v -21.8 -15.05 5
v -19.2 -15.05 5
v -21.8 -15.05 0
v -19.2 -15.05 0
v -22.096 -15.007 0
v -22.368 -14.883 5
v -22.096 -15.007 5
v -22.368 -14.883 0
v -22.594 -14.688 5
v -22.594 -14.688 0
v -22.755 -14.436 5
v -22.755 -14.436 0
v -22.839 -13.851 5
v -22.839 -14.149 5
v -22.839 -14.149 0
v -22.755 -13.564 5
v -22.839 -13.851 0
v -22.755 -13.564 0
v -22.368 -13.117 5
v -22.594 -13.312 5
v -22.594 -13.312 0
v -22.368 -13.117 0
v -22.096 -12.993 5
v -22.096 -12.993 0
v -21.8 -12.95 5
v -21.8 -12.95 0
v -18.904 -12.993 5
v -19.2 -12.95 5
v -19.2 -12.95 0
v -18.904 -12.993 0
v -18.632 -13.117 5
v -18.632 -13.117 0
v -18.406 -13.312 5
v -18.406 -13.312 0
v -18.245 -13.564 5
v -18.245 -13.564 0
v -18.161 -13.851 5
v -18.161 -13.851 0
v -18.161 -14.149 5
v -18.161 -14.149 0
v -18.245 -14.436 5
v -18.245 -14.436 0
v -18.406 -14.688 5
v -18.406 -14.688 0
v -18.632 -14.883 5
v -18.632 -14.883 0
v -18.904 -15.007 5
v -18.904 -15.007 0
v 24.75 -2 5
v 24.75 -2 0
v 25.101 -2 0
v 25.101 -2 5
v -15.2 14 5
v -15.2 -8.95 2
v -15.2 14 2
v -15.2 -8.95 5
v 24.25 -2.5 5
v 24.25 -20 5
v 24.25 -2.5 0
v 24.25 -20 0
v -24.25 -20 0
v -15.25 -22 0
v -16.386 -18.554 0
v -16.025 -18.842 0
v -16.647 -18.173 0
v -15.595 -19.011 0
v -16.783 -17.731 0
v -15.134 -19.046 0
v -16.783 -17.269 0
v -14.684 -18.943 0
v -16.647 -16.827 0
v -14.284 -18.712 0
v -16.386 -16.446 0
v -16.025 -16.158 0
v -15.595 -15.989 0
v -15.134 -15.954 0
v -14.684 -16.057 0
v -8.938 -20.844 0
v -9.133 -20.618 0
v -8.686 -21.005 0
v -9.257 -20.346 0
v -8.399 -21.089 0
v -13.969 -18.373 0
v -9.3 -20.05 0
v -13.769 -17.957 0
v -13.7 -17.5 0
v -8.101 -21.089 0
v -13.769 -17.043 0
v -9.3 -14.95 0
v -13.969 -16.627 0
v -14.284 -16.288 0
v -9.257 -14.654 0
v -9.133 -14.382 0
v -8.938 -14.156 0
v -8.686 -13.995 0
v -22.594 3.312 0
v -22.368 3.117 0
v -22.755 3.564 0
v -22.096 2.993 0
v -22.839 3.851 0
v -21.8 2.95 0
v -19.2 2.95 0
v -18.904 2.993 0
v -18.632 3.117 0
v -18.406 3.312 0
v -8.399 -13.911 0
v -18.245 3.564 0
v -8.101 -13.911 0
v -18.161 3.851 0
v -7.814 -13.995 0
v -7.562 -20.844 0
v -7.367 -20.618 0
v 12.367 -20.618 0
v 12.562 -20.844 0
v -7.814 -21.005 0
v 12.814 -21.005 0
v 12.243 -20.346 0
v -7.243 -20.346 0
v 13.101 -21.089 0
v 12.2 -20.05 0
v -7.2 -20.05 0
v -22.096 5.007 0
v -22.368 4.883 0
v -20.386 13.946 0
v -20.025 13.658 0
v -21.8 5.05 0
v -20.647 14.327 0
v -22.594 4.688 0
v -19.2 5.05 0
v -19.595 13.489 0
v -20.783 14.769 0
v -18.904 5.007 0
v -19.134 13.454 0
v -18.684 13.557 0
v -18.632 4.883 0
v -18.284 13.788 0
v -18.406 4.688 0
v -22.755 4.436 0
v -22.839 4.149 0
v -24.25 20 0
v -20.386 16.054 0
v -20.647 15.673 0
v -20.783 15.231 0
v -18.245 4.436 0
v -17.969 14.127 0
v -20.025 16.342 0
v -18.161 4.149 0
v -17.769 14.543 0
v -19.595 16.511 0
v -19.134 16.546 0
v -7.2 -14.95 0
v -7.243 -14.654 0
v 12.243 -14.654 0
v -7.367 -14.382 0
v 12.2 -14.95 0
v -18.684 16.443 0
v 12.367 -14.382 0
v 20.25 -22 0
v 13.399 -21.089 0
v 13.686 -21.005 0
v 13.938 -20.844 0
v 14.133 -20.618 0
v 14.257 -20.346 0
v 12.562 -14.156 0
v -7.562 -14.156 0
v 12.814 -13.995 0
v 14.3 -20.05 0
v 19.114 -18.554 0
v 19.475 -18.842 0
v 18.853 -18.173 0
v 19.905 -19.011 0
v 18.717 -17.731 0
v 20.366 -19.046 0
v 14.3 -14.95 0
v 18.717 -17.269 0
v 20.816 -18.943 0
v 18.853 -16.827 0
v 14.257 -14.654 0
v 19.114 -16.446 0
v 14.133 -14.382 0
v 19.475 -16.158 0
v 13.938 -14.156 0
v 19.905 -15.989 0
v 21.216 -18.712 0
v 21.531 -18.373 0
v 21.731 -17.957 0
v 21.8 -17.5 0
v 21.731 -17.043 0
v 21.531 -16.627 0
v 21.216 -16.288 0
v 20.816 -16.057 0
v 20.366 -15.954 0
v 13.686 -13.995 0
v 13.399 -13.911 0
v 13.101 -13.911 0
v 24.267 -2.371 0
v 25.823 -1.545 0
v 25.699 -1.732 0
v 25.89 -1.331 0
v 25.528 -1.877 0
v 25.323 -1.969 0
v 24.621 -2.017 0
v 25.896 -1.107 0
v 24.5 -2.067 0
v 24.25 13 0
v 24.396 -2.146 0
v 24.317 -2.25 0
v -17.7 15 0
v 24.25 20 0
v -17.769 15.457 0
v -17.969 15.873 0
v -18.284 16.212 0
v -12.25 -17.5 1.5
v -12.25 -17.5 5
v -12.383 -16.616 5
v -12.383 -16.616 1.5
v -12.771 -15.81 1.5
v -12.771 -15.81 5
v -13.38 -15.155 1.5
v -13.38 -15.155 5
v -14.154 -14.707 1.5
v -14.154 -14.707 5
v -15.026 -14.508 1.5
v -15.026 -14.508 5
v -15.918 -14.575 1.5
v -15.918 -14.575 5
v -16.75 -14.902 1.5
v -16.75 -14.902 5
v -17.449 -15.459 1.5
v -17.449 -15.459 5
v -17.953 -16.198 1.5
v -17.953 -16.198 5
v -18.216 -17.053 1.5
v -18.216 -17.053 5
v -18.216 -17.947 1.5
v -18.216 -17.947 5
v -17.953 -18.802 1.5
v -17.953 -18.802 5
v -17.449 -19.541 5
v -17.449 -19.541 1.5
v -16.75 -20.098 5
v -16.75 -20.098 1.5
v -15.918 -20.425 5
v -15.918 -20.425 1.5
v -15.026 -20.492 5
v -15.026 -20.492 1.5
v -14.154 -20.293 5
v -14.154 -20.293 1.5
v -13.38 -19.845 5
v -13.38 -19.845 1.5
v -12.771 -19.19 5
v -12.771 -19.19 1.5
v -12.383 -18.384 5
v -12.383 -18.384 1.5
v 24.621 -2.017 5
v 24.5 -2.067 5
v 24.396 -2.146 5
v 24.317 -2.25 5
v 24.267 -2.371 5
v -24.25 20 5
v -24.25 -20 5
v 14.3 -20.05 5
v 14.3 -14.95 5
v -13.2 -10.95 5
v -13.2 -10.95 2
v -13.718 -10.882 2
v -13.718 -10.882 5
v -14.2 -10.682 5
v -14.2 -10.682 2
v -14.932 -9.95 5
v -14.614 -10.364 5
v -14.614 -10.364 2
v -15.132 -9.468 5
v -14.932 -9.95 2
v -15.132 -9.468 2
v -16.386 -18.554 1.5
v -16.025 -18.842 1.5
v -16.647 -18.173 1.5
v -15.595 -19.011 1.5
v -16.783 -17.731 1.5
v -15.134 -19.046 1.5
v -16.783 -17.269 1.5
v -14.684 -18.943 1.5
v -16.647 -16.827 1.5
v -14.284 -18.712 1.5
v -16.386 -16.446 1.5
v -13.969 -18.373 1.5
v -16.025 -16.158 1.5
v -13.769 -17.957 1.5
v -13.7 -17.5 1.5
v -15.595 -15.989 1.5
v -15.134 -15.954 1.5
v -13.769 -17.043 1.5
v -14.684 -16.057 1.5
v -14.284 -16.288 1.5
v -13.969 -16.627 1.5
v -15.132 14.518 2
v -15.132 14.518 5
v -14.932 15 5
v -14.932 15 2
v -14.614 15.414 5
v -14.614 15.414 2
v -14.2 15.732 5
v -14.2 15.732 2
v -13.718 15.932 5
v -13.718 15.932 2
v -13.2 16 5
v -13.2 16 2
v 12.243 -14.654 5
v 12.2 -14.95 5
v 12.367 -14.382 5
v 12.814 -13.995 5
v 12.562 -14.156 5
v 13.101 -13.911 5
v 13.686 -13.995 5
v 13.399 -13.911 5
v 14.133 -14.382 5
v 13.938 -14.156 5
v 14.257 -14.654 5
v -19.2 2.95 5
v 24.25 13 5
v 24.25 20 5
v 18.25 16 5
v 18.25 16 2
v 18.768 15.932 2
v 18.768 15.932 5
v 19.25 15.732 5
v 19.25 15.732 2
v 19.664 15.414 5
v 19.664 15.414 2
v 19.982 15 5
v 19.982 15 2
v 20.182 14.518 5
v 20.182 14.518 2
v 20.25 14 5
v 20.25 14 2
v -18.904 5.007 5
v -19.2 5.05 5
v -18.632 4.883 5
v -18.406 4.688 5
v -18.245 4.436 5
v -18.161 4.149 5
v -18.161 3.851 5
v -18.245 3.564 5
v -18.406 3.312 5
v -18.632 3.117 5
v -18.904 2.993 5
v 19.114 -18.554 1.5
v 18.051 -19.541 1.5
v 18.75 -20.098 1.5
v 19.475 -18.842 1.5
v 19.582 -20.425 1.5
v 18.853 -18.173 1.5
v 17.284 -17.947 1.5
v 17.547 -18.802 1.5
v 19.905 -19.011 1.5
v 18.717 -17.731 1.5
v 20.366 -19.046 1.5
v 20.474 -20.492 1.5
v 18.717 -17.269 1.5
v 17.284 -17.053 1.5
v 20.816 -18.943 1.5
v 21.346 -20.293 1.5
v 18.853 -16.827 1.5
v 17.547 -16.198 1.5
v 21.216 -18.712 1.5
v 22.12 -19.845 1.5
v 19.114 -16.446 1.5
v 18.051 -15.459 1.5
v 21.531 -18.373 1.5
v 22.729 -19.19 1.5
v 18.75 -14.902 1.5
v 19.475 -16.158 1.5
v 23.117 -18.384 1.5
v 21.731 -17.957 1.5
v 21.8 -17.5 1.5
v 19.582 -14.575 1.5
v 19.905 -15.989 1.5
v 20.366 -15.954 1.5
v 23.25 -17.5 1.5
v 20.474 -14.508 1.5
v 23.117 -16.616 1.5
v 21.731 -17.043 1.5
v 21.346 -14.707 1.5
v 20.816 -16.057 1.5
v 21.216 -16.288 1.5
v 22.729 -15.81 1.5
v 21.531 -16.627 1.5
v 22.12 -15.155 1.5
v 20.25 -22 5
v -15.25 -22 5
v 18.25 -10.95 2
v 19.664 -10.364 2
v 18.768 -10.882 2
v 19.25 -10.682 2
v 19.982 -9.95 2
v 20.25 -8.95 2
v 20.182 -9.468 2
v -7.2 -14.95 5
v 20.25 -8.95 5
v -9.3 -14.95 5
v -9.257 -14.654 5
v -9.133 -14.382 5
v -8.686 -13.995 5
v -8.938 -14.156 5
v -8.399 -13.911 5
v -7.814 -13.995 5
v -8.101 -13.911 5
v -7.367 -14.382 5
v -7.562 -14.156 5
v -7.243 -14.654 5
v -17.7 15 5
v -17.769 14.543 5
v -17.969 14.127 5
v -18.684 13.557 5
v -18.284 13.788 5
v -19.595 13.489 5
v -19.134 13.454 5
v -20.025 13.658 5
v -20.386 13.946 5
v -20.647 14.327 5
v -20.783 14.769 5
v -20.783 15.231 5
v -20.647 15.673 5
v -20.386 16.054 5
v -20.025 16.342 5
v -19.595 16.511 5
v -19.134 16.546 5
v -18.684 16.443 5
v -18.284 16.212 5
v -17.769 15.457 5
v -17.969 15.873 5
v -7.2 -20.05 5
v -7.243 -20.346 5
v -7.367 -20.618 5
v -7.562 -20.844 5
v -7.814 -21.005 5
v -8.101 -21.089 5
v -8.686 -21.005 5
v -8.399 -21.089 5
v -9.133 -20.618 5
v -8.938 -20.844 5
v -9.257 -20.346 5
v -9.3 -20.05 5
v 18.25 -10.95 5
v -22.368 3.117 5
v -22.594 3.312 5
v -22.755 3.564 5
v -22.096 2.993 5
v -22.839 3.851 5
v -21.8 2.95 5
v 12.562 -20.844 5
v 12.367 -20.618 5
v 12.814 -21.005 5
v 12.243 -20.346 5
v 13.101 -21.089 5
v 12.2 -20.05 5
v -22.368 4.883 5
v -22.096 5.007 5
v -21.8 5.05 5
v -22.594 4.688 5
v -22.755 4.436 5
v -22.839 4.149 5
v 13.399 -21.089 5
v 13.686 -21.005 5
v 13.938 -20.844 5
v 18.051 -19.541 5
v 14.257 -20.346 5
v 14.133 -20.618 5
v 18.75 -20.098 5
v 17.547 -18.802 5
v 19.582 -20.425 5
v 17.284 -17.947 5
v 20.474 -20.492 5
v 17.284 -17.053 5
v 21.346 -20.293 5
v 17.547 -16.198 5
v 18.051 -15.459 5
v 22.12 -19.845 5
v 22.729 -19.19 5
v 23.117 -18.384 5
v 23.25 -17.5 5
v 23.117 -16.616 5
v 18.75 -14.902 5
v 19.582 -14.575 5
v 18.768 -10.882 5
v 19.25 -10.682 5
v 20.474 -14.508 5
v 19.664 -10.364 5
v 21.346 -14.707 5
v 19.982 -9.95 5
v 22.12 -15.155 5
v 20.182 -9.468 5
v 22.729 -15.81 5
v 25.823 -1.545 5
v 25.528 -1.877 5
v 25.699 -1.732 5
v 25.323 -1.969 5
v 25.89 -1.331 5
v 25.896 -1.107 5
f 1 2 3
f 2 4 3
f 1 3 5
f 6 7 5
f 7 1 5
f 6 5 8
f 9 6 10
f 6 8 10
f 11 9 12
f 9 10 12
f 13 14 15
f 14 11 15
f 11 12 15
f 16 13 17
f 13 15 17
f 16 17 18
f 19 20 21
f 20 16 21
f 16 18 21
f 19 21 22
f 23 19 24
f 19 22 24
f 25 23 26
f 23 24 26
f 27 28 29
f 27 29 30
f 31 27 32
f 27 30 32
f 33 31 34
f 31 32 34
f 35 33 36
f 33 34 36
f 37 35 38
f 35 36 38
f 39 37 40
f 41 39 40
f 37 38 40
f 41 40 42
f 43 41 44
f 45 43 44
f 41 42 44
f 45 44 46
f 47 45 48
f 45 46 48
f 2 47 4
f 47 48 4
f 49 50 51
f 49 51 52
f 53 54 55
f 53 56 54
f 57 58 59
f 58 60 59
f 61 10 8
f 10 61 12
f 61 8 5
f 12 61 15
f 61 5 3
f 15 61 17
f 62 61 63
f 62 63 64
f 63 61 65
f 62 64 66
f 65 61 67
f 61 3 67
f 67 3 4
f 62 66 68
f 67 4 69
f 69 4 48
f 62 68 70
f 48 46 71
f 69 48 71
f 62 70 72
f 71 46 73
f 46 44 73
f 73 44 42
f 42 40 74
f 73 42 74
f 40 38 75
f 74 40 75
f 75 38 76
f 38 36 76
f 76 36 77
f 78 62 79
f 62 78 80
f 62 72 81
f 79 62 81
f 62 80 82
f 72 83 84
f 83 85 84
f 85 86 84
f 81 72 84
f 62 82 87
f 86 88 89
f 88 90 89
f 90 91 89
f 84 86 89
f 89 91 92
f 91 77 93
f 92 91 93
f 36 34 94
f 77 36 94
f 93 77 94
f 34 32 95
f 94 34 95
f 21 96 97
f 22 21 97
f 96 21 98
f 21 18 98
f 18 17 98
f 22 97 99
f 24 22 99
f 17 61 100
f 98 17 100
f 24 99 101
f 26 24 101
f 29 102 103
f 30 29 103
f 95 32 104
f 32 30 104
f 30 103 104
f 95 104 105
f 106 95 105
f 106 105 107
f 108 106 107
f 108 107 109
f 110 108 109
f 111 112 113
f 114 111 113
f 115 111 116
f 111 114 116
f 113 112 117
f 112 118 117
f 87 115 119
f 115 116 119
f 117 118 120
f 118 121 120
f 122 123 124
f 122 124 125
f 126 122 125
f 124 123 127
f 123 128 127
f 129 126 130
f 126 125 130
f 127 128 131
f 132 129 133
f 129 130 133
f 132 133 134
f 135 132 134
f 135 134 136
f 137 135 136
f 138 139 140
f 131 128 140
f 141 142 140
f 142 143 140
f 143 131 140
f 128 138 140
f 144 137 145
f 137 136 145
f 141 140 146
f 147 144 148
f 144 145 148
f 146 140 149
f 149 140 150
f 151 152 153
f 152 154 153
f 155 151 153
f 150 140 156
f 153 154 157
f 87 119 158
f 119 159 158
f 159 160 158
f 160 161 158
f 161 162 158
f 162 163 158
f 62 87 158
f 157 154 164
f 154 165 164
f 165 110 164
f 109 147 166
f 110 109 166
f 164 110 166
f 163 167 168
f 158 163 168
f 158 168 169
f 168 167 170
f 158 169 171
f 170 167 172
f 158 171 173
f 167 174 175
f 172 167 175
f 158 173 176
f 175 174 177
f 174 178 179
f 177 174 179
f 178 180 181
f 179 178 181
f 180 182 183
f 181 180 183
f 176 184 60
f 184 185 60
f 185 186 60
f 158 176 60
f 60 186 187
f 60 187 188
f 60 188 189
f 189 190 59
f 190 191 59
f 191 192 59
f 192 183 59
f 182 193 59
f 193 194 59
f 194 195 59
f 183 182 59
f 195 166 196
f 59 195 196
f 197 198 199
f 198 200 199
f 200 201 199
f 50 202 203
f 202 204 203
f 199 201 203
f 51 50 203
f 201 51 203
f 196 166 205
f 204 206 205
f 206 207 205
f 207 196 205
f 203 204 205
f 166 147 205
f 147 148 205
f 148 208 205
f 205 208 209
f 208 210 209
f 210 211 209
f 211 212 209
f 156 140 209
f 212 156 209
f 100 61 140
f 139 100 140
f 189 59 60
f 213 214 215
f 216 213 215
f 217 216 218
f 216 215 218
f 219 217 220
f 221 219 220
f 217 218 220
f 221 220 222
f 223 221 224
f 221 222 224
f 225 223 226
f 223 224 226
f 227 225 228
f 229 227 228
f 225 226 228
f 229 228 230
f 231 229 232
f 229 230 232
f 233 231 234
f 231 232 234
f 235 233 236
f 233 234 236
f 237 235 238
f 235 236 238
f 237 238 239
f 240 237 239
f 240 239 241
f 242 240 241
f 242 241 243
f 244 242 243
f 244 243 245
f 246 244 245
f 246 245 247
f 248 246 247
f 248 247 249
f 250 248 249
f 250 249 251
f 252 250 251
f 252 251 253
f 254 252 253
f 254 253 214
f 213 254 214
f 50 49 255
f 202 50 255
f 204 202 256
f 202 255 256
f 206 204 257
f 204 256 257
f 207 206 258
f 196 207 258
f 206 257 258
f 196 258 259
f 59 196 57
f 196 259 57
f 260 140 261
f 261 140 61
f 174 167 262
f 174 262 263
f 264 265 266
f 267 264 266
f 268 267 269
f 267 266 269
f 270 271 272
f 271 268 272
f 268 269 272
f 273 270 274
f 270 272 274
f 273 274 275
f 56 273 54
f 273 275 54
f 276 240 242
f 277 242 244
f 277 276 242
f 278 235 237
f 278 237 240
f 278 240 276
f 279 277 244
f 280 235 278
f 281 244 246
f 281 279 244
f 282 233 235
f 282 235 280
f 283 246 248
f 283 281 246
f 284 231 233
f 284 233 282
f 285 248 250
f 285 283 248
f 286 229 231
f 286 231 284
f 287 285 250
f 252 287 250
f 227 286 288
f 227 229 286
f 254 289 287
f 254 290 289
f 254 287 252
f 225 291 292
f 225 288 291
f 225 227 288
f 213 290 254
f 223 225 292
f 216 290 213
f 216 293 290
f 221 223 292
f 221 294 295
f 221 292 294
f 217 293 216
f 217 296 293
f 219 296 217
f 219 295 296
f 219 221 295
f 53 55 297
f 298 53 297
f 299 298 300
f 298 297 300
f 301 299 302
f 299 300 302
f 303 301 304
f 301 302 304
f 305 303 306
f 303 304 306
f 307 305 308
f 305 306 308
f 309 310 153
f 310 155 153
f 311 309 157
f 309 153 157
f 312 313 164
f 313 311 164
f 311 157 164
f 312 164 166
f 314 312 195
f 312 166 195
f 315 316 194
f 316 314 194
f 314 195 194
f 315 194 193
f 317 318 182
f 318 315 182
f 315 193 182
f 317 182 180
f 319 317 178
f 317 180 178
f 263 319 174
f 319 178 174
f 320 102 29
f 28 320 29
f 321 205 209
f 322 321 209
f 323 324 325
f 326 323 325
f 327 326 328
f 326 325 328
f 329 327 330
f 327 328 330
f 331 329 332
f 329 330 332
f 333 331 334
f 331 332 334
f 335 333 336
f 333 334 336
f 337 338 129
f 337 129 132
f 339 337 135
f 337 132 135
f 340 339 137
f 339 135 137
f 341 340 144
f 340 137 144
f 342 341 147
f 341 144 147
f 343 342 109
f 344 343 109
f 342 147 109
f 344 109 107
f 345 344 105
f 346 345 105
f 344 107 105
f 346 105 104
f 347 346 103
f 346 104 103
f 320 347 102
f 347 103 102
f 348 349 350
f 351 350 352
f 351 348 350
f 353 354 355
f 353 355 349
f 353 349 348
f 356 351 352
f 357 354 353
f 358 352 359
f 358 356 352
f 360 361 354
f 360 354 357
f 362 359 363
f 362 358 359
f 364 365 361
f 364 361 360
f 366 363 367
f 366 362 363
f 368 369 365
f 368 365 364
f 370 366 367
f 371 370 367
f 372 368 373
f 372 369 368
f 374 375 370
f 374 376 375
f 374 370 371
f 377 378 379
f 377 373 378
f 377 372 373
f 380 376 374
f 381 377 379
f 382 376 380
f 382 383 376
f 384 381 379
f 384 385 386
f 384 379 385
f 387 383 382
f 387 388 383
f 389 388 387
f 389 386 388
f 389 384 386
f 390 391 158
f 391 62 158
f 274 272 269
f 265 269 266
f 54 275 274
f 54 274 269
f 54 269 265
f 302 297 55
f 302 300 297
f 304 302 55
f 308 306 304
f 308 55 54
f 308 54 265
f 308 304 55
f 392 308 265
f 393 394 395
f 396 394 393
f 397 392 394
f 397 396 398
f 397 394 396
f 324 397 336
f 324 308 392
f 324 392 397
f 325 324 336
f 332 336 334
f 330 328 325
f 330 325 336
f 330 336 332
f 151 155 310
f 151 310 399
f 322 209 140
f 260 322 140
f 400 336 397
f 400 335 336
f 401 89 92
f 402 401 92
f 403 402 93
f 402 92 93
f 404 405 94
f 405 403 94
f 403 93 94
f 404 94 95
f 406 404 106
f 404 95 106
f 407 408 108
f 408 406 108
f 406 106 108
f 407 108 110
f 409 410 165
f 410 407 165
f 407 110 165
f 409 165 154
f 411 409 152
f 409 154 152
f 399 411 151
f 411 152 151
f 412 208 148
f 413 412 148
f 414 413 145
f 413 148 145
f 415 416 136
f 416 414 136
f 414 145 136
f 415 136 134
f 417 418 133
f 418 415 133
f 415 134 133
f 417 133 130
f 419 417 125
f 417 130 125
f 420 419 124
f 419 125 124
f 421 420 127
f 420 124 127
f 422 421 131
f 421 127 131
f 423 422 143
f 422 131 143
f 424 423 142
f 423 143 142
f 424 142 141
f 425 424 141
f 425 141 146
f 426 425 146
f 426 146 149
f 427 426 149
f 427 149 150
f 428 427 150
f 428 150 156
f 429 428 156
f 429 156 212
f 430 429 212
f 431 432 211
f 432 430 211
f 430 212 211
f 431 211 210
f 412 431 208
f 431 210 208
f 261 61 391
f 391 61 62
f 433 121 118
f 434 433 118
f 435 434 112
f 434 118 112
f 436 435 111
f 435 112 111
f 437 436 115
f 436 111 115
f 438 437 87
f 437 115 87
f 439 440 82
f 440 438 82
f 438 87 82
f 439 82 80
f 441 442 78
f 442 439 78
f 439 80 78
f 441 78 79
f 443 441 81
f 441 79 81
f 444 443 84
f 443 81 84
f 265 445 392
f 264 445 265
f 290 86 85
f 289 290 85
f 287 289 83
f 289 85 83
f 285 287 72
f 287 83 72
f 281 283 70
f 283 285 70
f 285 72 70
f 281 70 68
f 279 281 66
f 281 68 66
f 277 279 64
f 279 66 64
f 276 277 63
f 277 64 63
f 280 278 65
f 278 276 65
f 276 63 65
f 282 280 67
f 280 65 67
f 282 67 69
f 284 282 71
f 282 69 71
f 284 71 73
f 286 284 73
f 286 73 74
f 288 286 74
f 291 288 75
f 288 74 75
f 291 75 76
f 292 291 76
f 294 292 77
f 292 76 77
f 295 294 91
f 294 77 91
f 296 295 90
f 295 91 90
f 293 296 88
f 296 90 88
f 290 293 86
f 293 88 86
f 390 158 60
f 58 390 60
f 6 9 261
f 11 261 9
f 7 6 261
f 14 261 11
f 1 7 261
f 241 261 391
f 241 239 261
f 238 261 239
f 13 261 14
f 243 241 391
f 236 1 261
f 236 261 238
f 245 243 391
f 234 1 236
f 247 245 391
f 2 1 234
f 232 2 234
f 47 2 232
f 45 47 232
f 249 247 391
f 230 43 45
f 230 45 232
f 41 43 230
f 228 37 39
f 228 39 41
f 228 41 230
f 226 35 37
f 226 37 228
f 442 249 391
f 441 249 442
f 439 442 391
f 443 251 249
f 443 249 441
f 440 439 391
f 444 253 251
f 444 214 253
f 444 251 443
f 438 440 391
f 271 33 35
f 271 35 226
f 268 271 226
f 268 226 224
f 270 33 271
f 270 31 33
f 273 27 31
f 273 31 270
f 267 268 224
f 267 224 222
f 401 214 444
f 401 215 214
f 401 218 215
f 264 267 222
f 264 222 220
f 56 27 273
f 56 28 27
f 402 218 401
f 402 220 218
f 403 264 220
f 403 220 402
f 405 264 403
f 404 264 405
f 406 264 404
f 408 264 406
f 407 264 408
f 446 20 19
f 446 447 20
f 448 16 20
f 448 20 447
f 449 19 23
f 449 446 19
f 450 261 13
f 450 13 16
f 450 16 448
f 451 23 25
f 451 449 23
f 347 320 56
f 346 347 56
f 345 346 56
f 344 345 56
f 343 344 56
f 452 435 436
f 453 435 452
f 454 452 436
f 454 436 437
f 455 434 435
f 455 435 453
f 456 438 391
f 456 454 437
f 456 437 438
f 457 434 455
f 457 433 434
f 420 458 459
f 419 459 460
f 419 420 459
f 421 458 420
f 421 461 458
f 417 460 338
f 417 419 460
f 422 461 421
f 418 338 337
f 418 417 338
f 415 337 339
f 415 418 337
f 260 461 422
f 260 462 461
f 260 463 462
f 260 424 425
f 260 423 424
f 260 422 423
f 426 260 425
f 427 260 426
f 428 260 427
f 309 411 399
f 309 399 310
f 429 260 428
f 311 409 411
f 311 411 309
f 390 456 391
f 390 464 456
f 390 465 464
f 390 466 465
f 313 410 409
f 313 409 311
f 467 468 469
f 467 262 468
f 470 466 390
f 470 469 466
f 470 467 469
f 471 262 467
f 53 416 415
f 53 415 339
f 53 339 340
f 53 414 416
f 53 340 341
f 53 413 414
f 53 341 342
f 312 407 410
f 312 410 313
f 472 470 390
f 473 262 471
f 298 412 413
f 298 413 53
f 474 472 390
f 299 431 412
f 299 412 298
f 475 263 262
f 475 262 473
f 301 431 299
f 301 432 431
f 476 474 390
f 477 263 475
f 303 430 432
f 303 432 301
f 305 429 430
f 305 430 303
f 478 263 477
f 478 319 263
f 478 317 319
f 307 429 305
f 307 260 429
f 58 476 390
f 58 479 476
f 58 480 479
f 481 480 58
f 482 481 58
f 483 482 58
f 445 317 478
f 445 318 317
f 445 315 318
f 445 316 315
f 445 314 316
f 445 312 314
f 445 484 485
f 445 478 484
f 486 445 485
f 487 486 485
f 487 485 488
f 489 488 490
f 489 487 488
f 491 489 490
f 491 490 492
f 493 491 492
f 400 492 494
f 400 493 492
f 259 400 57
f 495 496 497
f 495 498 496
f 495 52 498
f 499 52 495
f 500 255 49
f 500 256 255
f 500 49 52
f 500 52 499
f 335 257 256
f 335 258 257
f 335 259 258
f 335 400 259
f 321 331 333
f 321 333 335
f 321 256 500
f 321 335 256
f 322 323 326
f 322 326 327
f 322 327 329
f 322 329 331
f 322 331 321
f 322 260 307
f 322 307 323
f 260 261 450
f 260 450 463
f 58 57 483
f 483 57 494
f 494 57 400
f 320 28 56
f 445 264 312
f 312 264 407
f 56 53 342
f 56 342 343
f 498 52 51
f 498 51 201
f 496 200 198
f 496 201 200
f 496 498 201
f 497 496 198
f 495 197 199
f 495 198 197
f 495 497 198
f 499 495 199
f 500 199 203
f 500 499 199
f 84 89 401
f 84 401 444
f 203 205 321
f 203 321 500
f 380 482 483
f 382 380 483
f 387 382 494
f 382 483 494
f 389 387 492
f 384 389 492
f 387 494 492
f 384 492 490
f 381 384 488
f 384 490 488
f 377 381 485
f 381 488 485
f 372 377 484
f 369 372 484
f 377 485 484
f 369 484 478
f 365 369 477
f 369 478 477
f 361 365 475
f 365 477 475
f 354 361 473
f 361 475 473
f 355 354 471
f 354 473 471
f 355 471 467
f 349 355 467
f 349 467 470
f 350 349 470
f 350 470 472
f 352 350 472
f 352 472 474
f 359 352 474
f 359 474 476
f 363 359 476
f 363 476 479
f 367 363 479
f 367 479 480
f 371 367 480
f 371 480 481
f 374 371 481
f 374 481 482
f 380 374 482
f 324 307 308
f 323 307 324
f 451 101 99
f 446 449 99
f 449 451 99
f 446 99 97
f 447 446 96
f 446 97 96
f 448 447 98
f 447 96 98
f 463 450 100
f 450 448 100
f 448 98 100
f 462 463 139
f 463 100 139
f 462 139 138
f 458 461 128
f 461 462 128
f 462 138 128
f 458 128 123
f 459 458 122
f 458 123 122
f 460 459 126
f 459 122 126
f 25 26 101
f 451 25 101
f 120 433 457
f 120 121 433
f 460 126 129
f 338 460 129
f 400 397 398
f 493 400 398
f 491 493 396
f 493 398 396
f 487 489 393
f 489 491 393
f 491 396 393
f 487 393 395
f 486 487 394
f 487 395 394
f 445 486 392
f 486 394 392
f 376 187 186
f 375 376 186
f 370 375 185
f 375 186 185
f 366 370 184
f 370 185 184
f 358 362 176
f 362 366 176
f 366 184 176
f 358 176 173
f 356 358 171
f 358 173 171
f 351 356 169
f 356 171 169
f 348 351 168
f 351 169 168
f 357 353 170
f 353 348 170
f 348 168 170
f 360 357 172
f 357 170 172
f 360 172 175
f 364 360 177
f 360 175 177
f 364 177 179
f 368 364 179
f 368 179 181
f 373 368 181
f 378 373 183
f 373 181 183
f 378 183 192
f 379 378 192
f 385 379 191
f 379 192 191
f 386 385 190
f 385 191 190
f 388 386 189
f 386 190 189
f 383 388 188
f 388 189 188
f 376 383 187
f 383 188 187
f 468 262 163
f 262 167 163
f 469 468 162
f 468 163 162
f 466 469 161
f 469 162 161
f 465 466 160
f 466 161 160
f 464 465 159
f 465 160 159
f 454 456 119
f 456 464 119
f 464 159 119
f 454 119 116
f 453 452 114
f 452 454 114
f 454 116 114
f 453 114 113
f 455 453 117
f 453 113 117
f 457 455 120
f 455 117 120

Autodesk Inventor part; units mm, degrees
ref_plane "YZ Plane" through (0, 0, 0) normal (1, 0, 0) x (0, 1, 0)
ref_plane "XZ Plane" through (0, 0, 0) normal (0, 1, 0) x (-1, 0, 0)
ref_plane "XY Plane" through (0, 0, 0) normal (0, 0, 1) x (1, 0, 0)
sketch "スケッチ1" plane through (0, 0, 0) normal (0, 0, 1) x (1, 0, 0)
  line L0 (-24.25, -20) -> (24.25, -20) construction
  line L1 (24.25, -20) -> (24.25, 20)
  line L2 (24.25, 20) -> (-24.25, 20)
  line L3 (-24.25, 20) -> (-24.25, -20)
  line L4 (-24.25, -20) -> (24.25, 20) construction
  line L5 (24.25, -20) -> (-24.25, 20) construction
  circle A0 centre (-15.25, -17.5) radius 1.55
  circle A1 centre (20.25, -17.5) radius 1.55
  line L6 (-9.25, -15) -> (14.25, -15) construction
  line L7 (14.25, -15) -> (14.25, -20) construction
  line L8 (14.25, -20) -> (-9.25, -20) construction
  line L9 (-9.25, -20) -> (-9.25, -15) construction
  line L10 (-24.25, -20) -> (-15.25, -22)
  line L11 (-15.25, -22) -> (20.25, -22)
  line L12 (20.25, -22) -> (24.25, -20)
  line L13 (14.3, -14.95) -> (-9.3, -14.95)
  line L14 (-9.3, -14.95) -> (-9.3, -20.05)
  line L15 (-9.3, -20.05) -> (14.3, -20.05)
  line L16 (14.3, -20.05) -> (14.3, -14.95)
  circle A2 centre (-8.25, -14.95) radius 1.05
  circle A3 centre (-8.25, -20.05) radius 1.05
  circle A4 centre (13.25, -14.95) radius 1.05
  circle A5 centre (13.25, -20.05) radius 1.05
  circle A6 centre (-19.25, 15) radius 1.55
  line L17 (-21.8, 5.05) -> (-19.2, 5.05)
  line L18 (-19.2, 5.05) -> (-19.2, -15.05)
  line L19 (-19.2, -15.05) -> (-21.8, -15.05)
  line L20 (-21.8, -15.05) -> (-21.8, 5.05)
  line L21 (-19.25, 5) -> (-21.75, 5) construction
  line L22 (-21.75, 5) -> (-21.75, -15) construction
  line L23 (-21.75, -15) -> (-19.25, -15) construction
  line L24 (-19.25, -15) -> (-19.25, 5) construction
  line L25 (2.5, -14.95) -> (2.5, -20.05) construction
  circle A7 centre (-21.8, 4) radius 1.05
  circle A8 centre (-19.2, 4) radius 1.05
  circle A9 centre (-21.8, -14) radius 1.05
  circle A10 centre (-19.2, -14) radius 1.05
  point P0 (0, 0)
  point P1 (0, 0)
  point P2 (-9.25, -17.5)
  dimension "d8" = 2.1
  dimension "d22" = 2.1
  dimension "d1" = 5
  dimension "d2" = 3.1
  dimension "d3" = 35.5
  dimension "d4" = 2
  dimension "d5" = 40
  dimension "d6" = 23.5
  dimension "d7" = 0.05
  dimension "d9" = 3.1
  dimension "d10" = 5
  dimension "d11" = 5
  dimension "d12" = 0.05
  dimension "d13" = 17.75
  dimension "d14" = 48.5
  dimension "d15" = 4
  dimension "d18" = 2.5
  dimension "d19" = 2.5
  dimension "d20" = 5
  dimension "d21" = 15
  dimension "d23" = 25
extrude "押し出し1" add sketch "スケッチ1" along normal blind 5
sketch "スケッチ3" plane through (0, 0, 5) normal (0, 0, 1) x (1, 0, 0)
  line L0 (-15.2, 16) -> (20.25, 16)
  line L1 (20.25, 16) -> (20.25, -10.95)
  line L2 (20.25, -10.95) -> (-15.2, -10.95)
  line L3 (-15.2, -10.95) -> (-15.2, 16)
  line L4 (24.25, -20) -> (24.25, 20) projected
  line L5 (24.25, 20) -> (-24.25, 20) projected
  line L6 (-7.2, -14.95) -> (12.2, -14.95) projected
  line L7 (-19.2, 2.95) -> (-19.2, -12.95) projected
  point P0 (0, 0)
  dimension "d26" = 4
  dimension "d27" = 4
  dimension "d28" = 4
  dimension "d29" = 4
extrude "押し出し2" cut sketch "スケッチ3" against normal blind 3
sketch "スケッチ4" plane through (0, 0, 5) normal (0, 0, 1) x (1, 0, 0)
  circle A0 centre (-15.25, -17.5) radius 3
  circle A1 centre (20.25, -17.5) radius 3
  circle A2 centre (-15.25, -17.5) radius 1.55 projected
  circle A3 centre (20.25, -17.5) radius 1.55 projected
  point P0 (0, 0)
  dimension "d32" = 6
  dimension "d33" = 6
extrude "押し出し3" cut sketch "スケッチ4" against normal blind 3.5
fillet "フィレット1" radius 2 4 edges at (-15.2, 16, 3.5) (-15.2, -10.95, 3.5) (20.25, -10.95, 3.5) (20.25, 16, 3.5)
sketch "スケッチ10" plane through (24.25, -20, 0) normal (1, 0, 0) x (0, 0, -1)
  line L0 (-5, 40) -> (-5, 0) projected
  line L1 (-5, 33) -> (0, 33)
  line L2 (0, 33) -> (0, 18)
  line L3 (0, 18) -> (-5, 18)
  line L4 (-5, 18) -> (-5, 33)
  line L5 (0, 40) -> (-5, 40) projected
  point P0 (0, 20)
  dimension "d52" = 5
  dimension "d53" = 15
  dimension "d54" = 7
extrude "押し出し9" add sketch "スケッチ10" along normal blind 1.75
sketch "スケッチ11" plane through (0, 0, 0) normal (0, 0, -1) x (-1, 0, 0)
  line L0 (-24.25, -2) -> (-26, -2) projected
  line L1 (-26, -2) -> (-26, 13)
  line L2 (-24.25, 13) -> (-24.25, 20) projected
  line L3 (-26, 13) -> (-24.25, 13)
  line L4 (-26, -2) -> (-26, 13) projected
  line L5 (-24.25, 13) -> (-26, -2)
  point P0 (0, 0)
extrude "押し出し10" cut sketch "スケッチ11" against normal through all
fillet "フィレット2" radius 0.8 1 edges at (26, -2, 2.5)
fillet "フィレット3" radius 0.5 1 edges at (24.25, -2, 2.5)
equation "\"d11\" = d10"
equation "\"d13\" = 0.5 * d3"
equation "\"d27\" = d26"
equation "\"d28\" = d26"
equation "\"d29\" = d26"
properties part number "コックピット_サブフレーム_1_5_MIR" material "アセタール樹脂、黒"
